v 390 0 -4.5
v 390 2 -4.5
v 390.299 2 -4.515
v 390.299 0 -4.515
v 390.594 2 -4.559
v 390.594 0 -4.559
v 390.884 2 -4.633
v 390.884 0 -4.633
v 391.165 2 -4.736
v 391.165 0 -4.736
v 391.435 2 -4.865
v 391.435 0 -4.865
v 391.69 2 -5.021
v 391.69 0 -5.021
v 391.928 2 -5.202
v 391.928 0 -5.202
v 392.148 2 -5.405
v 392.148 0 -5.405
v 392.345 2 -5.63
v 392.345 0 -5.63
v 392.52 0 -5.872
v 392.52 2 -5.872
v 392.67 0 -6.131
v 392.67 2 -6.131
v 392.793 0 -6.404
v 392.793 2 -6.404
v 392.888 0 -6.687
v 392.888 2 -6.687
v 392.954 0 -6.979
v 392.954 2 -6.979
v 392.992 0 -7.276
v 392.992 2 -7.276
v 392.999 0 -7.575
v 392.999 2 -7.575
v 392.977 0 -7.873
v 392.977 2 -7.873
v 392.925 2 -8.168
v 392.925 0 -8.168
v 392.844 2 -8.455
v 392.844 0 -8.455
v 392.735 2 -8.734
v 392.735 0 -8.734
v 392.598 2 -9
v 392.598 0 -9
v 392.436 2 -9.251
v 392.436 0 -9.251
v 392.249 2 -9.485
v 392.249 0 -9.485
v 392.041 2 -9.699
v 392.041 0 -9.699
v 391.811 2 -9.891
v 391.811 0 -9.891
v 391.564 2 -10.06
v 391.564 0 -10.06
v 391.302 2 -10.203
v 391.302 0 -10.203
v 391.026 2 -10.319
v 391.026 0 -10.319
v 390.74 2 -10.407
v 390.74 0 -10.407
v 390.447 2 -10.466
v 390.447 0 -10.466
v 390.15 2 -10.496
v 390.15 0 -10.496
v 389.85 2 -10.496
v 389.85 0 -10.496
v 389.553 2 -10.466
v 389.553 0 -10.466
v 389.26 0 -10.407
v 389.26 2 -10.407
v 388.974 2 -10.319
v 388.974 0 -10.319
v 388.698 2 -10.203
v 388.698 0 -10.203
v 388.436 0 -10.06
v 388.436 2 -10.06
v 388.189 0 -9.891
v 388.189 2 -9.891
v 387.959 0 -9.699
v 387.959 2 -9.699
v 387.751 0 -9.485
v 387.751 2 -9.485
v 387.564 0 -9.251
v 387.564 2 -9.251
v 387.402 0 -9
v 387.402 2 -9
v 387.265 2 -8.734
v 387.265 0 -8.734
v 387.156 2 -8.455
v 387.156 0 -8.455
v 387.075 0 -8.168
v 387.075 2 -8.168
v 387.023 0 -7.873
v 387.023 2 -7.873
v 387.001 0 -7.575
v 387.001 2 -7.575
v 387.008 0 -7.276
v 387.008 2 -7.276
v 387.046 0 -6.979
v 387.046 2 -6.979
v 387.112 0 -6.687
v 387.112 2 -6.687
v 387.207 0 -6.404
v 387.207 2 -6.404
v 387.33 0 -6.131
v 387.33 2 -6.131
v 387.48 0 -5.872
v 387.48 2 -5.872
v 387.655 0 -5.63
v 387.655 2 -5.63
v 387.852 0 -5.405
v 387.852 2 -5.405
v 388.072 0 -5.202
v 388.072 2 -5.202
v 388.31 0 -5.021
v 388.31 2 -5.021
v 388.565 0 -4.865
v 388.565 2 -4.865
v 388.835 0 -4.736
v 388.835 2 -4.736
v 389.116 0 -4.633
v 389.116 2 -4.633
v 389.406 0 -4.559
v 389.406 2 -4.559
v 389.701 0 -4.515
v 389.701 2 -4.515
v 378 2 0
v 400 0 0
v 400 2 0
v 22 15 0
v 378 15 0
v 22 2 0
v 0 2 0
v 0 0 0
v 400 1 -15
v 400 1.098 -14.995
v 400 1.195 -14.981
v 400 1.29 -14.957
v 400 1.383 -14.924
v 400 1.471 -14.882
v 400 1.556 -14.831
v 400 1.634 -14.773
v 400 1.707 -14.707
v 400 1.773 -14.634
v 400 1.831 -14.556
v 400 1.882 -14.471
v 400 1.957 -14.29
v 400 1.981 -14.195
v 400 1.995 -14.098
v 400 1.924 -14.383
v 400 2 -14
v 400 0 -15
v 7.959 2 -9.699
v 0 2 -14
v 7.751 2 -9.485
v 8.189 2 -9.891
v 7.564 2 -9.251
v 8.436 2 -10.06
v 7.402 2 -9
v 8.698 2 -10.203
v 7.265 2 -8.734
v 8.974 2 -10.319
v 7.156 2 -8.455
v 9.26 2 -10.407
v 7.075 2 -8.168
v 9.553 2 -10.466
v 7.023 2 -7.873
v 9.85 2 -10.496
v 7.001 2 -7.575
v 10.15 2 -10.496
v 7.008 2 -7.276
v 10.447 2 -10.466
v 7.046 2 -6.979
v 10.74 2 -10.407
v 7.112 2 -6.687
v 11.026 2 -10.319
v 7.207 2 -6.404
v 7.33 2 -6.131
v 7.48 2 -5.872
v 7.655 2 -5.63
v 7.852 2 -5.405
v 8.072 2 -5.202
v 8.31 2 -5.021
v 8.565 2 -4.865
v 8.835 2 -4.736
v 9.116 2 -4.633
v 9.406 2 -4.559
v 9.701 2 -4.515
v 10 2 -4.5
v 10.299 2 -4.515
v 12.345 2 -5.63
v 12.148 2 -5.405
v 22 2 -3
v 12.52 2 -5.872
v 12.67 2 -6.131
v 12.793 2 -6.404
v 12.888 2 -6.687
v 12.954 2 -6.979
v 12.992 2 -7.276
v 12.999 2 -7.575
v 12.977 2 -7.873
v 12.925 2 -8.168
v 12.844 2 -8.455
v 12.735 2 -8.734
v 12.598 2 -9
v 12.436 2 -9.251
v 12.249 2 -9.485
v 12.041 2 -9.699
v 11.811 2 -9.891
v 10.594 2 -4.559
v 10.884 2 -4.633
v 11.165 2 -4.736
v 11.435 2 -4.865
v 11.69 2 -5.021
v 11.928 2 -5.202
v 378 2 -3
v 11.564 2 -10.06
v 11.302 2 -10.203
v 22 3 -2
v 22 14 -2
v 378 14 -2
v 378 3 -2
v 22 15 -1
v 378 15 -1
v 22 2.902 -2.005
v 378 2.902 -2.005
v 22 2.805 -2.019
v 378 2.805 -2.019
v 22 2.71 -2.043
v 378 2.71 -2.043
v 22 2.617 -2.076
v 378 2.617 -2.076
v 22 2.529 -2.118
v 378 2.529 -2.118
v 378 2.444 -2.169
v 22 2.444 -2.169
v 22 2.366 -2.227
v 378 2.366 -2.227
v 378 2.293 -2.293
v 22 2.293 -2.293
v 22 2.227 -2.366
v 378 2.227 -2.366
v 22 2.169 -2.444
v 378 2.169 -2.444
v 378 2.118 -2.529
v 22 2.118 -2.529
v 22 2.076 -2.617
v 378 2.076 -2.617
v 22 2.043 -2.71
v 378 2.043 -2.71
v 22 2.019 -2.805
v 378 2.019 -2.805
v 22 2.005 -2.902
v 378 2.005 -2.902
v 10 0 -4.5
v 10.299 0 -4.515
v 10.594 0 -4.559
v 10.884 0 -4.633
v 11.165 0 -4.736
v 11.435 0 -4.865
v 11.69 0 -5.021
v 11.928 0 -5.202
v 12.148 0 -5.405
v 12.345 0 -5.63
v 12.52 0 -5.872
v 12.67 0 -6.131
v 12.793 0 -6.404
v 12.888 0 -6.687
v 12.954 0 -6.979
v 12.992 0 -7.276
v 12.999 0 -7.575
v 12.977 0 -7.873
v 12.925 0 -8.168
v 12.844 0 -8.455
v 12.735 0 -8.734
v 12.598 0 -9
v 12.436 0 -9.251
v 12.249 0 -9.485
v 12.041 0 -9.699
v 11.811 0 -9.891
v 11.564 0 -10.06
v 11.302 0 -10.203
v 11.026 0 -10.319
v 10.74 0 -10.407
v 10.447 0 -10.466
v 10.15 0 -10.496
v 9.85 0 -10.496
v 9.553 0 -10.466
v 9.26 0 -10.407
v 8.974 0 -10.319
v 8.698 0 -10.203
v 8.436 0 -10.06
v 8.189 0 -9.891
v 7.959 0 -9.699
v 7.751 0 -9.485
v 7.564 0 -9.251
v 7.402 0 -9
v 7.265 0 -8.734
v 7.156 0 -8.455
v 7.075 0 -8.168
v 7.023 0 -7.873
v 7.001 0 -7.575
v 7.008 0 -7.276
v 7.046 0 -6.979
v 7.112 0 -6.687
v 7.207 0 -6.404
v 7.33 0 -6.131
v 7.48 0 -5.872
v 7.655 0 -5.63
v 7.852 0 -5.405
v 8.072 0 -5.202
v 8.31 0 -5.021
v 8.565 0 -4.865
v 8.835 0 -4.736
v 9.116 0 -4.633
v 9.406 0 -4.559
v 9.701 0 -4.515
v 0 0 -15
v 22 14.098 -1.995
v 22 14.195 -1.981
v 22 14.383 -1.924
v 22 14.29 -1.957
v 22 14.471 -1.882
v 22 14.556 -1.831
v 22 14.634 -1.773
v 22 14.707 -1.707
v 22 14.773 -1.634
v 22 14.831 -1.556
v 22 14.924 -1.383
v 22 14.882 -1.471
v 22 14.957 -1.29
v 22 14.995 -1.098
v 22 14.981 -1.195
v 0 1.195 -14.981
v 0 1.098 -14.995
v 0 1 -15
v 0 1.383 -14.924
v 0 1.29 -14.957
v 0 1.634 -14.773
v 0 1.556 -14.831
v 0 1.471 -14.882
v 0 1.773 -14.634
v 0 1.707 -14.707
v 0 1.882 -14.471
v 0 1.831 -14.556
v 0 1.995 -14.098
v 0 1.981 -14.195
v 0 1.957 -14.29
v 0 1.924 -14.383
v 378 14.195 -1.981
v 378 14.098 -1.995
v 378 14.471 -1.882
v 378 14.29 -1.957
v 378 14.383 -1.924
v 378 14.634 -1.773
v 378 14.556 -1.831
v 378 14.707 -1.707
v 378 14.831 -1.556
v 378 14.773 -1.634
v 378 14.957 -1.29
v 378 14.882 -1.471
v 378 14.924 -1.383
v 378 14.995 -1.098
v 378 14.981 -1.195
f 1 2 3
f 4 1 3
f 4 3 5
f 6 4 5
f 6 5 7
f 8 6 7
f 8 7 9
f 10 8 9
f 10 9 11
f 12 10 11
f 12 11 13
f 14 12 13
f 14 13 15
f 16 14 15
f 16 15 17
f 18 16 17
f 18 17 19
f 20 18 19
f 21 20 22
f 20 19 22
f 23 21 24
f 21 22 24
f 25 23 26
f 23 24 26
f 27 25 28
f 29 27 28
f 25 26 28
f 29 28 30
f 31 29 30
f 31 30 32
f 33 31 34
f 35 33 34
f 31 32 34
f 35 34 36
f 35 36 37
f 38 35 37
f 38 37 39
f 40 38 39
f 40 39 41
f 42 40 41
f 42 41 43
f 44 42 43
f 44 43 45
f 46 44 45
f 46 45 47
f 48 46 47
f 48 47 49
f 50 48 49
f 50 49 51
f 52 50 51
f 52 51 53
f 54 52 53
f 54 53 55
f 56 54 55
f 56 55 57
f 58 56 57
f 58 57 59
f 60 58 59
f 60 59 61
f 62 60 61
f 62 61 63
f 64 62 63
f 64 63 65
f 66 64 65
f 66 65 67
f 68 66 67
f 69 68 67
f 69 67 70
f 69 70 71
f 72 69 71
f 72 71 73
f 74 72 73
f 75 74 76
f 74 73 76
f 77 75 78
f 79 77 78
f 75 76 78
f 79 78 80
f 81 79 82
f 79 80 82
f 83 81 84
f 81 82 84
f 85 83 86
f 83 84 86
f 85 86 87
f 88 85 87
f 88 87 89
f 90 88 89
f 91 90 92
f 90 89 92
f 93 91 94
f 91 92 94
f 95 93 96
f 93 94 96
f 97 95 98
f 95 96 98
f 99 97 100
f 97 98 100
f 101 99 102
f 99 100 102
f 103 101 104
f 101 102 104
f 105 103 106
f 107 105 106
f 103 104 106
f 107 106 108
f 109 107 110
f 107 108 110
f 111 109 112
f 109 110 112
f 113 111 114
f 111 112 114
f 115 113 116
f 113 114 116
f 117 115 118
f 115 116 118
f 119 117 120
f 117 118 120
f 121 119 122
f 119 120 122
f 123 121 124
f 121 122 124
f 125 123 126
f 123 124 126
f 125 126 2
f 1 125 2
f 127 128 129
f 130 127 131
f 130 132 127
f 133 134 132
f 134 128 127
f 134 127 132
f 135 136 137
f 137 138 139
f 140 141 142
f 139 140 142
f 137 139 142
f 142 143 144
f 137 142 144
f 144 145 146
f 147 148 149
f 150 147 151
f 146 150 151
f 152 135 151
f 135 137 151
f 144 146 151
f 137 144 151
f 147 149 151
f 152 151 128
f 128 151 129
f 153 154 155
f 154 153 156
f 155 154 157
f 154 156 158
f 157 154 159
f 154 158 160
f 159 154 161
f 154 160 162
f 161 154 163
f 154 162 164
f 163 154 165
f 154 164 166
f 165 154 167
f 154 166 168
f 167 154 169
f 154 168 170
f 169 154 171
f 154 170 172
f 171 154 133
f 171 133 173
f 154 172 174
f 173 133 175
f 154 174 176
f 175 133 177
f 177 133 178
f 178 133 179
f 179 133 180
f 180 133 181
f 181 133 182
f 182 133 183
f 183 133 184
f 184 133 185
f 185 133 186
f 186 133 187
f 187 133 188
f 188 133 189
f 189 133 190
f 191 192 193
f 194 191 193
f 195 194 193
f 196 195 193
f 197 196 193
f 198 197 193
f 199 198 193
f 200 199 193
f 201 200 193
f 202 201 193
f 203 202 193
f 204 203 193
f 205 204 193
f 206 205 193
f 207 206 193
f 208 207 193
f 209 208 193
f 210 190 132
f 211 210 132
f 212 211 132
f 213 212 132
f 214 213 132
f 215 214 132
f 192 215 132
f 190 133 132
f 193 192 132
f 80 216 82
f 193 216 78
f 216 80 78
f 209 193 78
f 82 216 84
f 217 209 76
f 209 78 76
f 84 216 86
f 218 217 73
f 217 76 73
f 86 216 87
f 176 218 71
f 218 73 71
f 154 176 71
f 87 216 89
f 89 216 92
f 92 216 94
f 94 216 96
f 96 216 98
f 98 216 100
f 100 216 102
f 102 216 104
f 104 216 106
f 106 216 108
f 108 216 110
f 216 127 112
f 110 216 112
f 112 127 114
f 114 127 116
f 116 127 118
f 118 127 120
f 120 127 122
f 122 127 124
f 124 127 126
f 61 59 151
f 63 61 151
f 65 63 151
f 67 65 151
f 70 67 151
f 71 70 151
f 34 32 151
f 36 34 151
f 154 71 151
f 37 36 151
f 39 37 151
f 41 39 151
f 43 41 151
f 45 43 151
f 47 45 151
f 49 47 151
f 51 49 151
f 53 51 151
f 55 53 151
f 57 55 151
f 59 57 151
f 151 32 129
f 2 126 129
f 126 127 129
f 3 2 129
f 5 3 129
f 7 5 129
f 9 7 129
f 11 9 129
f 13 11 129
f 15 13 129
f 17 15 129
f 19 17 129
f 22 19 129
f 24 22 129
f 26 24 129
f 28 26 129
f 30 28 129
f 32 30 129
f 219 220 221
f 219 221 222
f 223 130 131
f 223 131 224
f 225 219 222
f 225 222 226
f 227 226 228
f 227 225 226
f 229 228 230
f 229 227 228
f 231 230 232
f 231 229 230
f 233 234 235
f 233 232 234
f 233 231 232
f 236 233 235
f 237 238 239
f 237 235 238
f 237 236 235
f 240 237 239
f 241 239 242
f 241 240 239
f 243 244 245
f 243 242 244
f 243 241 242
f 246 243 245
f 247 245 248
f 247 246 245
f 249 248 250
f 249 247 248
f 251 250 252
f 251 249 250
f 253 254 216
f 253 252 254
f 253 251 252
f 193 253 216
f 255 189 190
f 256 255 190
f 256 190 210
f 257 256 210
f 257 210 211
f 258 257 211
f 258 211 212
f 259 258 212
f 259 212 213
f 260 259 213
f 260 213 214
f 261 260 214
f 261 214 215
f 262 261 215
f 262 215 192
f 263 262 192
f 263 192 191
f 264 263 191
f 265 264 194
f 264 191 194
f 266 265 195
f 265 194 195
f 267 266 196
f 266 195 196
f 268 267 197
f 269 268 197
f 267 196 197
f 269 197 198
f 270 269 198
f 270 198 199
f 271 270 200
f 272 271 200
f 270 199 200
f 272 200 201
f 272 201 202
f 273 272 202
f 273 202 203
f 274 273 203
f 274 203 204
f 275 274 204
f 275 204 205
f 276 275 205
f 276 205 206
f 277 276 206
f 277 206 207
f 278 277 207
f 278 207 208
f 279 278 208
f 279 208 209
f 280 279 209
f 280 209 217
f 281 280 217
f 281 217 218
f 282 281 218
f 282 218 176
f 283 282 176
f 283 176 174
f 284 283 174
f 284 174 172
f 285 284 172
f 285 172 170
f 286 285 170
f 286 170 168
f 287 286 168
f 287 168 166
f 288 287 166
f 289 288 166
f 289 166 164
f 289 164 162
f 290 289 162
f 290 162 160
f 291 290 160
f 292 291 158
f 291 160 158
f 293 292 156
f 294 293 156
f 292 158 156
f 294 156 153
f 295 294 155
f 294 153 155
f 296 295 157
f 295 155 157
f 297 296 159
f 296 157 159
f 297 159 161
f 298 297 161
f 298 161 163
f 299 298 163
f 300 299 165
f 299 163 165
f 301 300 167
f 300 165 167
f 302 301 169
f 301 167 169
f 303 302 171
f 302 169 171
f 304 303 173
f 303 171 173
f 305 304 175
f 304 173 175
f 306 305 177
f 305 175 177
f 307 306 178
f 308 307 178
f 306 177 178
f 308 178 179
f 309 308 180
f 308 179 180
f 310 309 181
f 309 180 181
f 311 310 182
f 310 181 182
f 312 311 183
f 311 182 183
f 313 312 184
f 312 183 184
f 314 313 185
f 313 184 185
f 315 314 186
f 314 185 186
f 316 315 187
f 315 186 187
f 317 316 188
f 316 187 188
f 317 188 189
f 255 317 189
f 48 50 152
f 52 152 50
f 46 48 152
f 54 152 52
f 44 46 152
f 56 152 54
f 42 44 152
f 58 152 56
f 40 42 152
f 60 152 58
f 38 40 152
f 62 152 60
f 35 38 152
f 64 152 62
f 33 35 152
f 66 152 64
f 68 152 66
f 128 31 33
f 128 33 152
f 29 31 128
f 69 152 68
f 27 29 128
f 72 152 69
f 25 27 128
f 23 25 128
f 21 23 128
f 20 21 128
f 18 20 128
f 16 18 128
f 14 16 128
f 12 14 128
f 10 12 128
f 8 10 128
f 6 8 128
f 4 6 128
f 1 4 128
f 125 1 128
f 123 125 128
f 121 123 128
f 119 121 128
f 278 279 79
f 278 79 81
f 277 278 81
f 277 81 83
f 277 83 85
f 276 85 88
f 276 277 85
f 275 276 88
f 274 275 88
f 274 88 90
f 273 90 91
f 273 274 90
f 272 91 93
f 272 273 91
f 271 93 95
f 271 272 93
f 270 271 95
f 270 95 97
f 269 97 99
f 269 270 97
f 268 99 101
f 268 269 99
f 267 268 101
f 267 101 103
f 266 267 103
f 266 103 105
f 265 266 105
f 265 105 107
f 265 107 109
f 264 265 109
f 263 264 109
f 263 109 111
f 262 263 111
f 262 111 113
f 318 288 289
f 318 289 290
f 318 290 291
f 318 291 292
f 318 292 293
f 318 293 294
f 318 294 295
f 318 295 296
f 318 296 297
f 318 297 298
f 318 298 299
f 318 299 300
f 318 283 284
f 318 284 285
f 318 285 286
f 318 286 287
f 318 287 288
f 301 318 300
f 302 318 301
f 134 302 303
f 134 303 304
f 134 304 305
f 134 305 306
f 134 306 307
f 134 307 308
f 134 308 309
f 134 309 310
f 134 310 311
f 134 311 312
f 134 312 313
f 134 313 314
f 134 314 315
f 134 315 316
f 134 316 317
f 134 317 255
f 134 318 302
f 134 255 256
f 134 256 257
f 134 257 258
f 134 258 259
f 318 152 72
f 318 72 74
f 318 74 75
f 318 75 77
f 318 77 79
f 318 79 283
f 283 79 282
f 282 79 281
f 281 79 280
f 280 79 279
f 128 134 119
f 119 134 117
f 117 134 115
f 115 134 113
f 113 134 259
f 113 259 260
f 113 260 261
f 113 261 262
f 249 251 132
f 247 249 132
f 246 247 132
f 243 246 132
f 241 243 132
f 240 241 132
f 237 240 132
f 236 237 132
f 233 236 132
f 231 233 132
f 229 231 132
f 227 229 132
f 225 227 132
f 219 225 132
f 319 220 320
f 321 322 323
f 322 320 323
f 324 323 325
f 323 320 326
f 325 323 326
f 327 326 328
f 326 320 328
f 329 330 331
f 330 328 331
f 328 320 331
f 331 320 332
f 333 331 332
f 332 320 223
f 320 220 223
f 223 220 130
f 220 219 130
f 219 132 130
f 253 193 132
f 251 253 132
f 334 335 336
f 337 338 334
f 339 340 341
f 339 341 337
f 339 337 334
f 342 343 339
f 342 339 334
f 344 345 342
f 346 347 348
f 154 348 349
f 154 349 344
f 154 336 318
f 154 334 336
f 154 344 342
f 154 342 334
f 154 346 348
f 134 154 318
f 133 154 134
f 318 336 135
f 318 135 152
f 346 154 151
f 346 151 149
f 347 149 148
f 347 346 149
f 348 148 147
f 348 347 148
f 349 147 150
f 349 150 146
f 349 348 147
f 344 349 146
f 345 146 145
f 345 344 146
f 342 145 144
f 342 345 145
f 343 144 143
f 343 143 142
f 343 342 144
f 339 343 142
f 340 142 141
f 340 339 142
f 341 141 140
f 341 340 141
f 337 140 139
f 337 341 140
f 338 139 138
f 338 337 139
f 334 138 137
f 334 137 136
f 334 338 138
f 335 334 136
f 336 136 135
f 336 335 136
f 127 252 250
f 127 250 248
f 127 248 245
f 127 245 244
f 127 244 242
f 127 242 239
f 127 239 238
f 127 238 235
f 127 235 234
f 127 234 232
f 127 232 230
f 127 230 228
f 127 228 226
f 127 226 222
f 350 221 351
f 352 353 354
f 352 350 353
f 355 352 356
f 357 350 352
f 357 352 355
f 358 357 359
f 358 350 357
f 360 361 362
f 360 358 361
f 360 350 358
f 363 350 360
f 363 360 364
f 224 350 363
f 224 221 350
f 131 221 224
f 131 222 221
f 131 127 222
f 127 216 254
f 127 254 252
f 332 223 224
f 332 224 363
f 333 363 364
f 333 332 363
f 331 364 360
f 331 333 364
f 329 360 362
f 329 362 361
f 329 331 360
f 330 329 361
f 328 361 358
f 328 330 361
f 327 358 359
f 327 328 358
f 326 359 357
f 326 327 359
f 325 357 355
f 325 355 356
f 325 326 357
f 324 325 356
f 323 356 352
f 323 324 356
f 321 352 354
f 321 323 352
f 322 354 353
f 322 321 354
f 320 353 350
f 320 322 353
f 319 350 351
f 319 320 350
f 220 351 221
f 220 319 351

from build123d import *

# Parameters (mm, degrees)
EXTRUDE_1_DEPTH     = 400
SKETCH_2_W          = 22
SKETCH_2_H          = 13
CUT_EXTRUDE_1_DEPTH = 401.562105047
SKETCH_3_R          = 3
CUT_EXTRUDE_2_DEPTH = 401.492197177


with BuildPart() as part:
    # Эскиз1 → Бобышка-Вытянуть1 (new body)
    with BuildSketch(Plane(origin=(0, 0, 0), x_dir=(0, 0, -1), z_dir=(1, 0, 0))):
        with BuildLine():
            Line((0, 0), (0, 15))
            Line((0, 15), (1, 15))
            ThreePointArc((1, 15), (1.707106781, 14.707106781), (2, 14))
            Line((2, 14), (2, 3))
            ThreePointArc((2, 3), (2.292893219, 2.292893219), (3, 2))
            Line((3, 2), (14, 2))
            ThreePointArc((14, 2), (14.707106781, 1.707106781), (15, 1))
            Line((15, 1), (15, 0))
            Line((15, 0), (0, 0))
        make_face()
    extrude(amount=EXTRUDE_1_DEPTH)

    # Эскиз2 → Вырез-Вытянуть1 (cut, through all)
    with BuildSketch(Plane.XY):
        with Locations((389, 8.5)):
            Rectangle(SKETCH_2_W, SKETCH_2_H)
        with Locations((11, 8.5)):
            Rectangle(SKETCH_2_W, SKETCH_2_H)
    extrude(amount=-CUT_EXTRUDE_1_DEPTH, mode=Mode.SUBTRACT)

    # Эскиз3 → Вырез-Вытянуть2 (cut, through all)
    with BuildSketch(Plane(origin=(0, 2, 0), x_dir=(1, 0, 0), z_dir=(0, 1, 0))):
        with Locations(Location((390, 7.5, 0), (0, 0, 270))):
            Circle(SKETCH_3_R)
        with Locations(Location((10, 7.5, 0), (0, 0, 270))):
            Circle(SKETCH_3_R)
    extrude(amount=-CUT_EXTRUDE_2_DEPTH, mode=Mode.SUBTRACT)


solid = part.part
